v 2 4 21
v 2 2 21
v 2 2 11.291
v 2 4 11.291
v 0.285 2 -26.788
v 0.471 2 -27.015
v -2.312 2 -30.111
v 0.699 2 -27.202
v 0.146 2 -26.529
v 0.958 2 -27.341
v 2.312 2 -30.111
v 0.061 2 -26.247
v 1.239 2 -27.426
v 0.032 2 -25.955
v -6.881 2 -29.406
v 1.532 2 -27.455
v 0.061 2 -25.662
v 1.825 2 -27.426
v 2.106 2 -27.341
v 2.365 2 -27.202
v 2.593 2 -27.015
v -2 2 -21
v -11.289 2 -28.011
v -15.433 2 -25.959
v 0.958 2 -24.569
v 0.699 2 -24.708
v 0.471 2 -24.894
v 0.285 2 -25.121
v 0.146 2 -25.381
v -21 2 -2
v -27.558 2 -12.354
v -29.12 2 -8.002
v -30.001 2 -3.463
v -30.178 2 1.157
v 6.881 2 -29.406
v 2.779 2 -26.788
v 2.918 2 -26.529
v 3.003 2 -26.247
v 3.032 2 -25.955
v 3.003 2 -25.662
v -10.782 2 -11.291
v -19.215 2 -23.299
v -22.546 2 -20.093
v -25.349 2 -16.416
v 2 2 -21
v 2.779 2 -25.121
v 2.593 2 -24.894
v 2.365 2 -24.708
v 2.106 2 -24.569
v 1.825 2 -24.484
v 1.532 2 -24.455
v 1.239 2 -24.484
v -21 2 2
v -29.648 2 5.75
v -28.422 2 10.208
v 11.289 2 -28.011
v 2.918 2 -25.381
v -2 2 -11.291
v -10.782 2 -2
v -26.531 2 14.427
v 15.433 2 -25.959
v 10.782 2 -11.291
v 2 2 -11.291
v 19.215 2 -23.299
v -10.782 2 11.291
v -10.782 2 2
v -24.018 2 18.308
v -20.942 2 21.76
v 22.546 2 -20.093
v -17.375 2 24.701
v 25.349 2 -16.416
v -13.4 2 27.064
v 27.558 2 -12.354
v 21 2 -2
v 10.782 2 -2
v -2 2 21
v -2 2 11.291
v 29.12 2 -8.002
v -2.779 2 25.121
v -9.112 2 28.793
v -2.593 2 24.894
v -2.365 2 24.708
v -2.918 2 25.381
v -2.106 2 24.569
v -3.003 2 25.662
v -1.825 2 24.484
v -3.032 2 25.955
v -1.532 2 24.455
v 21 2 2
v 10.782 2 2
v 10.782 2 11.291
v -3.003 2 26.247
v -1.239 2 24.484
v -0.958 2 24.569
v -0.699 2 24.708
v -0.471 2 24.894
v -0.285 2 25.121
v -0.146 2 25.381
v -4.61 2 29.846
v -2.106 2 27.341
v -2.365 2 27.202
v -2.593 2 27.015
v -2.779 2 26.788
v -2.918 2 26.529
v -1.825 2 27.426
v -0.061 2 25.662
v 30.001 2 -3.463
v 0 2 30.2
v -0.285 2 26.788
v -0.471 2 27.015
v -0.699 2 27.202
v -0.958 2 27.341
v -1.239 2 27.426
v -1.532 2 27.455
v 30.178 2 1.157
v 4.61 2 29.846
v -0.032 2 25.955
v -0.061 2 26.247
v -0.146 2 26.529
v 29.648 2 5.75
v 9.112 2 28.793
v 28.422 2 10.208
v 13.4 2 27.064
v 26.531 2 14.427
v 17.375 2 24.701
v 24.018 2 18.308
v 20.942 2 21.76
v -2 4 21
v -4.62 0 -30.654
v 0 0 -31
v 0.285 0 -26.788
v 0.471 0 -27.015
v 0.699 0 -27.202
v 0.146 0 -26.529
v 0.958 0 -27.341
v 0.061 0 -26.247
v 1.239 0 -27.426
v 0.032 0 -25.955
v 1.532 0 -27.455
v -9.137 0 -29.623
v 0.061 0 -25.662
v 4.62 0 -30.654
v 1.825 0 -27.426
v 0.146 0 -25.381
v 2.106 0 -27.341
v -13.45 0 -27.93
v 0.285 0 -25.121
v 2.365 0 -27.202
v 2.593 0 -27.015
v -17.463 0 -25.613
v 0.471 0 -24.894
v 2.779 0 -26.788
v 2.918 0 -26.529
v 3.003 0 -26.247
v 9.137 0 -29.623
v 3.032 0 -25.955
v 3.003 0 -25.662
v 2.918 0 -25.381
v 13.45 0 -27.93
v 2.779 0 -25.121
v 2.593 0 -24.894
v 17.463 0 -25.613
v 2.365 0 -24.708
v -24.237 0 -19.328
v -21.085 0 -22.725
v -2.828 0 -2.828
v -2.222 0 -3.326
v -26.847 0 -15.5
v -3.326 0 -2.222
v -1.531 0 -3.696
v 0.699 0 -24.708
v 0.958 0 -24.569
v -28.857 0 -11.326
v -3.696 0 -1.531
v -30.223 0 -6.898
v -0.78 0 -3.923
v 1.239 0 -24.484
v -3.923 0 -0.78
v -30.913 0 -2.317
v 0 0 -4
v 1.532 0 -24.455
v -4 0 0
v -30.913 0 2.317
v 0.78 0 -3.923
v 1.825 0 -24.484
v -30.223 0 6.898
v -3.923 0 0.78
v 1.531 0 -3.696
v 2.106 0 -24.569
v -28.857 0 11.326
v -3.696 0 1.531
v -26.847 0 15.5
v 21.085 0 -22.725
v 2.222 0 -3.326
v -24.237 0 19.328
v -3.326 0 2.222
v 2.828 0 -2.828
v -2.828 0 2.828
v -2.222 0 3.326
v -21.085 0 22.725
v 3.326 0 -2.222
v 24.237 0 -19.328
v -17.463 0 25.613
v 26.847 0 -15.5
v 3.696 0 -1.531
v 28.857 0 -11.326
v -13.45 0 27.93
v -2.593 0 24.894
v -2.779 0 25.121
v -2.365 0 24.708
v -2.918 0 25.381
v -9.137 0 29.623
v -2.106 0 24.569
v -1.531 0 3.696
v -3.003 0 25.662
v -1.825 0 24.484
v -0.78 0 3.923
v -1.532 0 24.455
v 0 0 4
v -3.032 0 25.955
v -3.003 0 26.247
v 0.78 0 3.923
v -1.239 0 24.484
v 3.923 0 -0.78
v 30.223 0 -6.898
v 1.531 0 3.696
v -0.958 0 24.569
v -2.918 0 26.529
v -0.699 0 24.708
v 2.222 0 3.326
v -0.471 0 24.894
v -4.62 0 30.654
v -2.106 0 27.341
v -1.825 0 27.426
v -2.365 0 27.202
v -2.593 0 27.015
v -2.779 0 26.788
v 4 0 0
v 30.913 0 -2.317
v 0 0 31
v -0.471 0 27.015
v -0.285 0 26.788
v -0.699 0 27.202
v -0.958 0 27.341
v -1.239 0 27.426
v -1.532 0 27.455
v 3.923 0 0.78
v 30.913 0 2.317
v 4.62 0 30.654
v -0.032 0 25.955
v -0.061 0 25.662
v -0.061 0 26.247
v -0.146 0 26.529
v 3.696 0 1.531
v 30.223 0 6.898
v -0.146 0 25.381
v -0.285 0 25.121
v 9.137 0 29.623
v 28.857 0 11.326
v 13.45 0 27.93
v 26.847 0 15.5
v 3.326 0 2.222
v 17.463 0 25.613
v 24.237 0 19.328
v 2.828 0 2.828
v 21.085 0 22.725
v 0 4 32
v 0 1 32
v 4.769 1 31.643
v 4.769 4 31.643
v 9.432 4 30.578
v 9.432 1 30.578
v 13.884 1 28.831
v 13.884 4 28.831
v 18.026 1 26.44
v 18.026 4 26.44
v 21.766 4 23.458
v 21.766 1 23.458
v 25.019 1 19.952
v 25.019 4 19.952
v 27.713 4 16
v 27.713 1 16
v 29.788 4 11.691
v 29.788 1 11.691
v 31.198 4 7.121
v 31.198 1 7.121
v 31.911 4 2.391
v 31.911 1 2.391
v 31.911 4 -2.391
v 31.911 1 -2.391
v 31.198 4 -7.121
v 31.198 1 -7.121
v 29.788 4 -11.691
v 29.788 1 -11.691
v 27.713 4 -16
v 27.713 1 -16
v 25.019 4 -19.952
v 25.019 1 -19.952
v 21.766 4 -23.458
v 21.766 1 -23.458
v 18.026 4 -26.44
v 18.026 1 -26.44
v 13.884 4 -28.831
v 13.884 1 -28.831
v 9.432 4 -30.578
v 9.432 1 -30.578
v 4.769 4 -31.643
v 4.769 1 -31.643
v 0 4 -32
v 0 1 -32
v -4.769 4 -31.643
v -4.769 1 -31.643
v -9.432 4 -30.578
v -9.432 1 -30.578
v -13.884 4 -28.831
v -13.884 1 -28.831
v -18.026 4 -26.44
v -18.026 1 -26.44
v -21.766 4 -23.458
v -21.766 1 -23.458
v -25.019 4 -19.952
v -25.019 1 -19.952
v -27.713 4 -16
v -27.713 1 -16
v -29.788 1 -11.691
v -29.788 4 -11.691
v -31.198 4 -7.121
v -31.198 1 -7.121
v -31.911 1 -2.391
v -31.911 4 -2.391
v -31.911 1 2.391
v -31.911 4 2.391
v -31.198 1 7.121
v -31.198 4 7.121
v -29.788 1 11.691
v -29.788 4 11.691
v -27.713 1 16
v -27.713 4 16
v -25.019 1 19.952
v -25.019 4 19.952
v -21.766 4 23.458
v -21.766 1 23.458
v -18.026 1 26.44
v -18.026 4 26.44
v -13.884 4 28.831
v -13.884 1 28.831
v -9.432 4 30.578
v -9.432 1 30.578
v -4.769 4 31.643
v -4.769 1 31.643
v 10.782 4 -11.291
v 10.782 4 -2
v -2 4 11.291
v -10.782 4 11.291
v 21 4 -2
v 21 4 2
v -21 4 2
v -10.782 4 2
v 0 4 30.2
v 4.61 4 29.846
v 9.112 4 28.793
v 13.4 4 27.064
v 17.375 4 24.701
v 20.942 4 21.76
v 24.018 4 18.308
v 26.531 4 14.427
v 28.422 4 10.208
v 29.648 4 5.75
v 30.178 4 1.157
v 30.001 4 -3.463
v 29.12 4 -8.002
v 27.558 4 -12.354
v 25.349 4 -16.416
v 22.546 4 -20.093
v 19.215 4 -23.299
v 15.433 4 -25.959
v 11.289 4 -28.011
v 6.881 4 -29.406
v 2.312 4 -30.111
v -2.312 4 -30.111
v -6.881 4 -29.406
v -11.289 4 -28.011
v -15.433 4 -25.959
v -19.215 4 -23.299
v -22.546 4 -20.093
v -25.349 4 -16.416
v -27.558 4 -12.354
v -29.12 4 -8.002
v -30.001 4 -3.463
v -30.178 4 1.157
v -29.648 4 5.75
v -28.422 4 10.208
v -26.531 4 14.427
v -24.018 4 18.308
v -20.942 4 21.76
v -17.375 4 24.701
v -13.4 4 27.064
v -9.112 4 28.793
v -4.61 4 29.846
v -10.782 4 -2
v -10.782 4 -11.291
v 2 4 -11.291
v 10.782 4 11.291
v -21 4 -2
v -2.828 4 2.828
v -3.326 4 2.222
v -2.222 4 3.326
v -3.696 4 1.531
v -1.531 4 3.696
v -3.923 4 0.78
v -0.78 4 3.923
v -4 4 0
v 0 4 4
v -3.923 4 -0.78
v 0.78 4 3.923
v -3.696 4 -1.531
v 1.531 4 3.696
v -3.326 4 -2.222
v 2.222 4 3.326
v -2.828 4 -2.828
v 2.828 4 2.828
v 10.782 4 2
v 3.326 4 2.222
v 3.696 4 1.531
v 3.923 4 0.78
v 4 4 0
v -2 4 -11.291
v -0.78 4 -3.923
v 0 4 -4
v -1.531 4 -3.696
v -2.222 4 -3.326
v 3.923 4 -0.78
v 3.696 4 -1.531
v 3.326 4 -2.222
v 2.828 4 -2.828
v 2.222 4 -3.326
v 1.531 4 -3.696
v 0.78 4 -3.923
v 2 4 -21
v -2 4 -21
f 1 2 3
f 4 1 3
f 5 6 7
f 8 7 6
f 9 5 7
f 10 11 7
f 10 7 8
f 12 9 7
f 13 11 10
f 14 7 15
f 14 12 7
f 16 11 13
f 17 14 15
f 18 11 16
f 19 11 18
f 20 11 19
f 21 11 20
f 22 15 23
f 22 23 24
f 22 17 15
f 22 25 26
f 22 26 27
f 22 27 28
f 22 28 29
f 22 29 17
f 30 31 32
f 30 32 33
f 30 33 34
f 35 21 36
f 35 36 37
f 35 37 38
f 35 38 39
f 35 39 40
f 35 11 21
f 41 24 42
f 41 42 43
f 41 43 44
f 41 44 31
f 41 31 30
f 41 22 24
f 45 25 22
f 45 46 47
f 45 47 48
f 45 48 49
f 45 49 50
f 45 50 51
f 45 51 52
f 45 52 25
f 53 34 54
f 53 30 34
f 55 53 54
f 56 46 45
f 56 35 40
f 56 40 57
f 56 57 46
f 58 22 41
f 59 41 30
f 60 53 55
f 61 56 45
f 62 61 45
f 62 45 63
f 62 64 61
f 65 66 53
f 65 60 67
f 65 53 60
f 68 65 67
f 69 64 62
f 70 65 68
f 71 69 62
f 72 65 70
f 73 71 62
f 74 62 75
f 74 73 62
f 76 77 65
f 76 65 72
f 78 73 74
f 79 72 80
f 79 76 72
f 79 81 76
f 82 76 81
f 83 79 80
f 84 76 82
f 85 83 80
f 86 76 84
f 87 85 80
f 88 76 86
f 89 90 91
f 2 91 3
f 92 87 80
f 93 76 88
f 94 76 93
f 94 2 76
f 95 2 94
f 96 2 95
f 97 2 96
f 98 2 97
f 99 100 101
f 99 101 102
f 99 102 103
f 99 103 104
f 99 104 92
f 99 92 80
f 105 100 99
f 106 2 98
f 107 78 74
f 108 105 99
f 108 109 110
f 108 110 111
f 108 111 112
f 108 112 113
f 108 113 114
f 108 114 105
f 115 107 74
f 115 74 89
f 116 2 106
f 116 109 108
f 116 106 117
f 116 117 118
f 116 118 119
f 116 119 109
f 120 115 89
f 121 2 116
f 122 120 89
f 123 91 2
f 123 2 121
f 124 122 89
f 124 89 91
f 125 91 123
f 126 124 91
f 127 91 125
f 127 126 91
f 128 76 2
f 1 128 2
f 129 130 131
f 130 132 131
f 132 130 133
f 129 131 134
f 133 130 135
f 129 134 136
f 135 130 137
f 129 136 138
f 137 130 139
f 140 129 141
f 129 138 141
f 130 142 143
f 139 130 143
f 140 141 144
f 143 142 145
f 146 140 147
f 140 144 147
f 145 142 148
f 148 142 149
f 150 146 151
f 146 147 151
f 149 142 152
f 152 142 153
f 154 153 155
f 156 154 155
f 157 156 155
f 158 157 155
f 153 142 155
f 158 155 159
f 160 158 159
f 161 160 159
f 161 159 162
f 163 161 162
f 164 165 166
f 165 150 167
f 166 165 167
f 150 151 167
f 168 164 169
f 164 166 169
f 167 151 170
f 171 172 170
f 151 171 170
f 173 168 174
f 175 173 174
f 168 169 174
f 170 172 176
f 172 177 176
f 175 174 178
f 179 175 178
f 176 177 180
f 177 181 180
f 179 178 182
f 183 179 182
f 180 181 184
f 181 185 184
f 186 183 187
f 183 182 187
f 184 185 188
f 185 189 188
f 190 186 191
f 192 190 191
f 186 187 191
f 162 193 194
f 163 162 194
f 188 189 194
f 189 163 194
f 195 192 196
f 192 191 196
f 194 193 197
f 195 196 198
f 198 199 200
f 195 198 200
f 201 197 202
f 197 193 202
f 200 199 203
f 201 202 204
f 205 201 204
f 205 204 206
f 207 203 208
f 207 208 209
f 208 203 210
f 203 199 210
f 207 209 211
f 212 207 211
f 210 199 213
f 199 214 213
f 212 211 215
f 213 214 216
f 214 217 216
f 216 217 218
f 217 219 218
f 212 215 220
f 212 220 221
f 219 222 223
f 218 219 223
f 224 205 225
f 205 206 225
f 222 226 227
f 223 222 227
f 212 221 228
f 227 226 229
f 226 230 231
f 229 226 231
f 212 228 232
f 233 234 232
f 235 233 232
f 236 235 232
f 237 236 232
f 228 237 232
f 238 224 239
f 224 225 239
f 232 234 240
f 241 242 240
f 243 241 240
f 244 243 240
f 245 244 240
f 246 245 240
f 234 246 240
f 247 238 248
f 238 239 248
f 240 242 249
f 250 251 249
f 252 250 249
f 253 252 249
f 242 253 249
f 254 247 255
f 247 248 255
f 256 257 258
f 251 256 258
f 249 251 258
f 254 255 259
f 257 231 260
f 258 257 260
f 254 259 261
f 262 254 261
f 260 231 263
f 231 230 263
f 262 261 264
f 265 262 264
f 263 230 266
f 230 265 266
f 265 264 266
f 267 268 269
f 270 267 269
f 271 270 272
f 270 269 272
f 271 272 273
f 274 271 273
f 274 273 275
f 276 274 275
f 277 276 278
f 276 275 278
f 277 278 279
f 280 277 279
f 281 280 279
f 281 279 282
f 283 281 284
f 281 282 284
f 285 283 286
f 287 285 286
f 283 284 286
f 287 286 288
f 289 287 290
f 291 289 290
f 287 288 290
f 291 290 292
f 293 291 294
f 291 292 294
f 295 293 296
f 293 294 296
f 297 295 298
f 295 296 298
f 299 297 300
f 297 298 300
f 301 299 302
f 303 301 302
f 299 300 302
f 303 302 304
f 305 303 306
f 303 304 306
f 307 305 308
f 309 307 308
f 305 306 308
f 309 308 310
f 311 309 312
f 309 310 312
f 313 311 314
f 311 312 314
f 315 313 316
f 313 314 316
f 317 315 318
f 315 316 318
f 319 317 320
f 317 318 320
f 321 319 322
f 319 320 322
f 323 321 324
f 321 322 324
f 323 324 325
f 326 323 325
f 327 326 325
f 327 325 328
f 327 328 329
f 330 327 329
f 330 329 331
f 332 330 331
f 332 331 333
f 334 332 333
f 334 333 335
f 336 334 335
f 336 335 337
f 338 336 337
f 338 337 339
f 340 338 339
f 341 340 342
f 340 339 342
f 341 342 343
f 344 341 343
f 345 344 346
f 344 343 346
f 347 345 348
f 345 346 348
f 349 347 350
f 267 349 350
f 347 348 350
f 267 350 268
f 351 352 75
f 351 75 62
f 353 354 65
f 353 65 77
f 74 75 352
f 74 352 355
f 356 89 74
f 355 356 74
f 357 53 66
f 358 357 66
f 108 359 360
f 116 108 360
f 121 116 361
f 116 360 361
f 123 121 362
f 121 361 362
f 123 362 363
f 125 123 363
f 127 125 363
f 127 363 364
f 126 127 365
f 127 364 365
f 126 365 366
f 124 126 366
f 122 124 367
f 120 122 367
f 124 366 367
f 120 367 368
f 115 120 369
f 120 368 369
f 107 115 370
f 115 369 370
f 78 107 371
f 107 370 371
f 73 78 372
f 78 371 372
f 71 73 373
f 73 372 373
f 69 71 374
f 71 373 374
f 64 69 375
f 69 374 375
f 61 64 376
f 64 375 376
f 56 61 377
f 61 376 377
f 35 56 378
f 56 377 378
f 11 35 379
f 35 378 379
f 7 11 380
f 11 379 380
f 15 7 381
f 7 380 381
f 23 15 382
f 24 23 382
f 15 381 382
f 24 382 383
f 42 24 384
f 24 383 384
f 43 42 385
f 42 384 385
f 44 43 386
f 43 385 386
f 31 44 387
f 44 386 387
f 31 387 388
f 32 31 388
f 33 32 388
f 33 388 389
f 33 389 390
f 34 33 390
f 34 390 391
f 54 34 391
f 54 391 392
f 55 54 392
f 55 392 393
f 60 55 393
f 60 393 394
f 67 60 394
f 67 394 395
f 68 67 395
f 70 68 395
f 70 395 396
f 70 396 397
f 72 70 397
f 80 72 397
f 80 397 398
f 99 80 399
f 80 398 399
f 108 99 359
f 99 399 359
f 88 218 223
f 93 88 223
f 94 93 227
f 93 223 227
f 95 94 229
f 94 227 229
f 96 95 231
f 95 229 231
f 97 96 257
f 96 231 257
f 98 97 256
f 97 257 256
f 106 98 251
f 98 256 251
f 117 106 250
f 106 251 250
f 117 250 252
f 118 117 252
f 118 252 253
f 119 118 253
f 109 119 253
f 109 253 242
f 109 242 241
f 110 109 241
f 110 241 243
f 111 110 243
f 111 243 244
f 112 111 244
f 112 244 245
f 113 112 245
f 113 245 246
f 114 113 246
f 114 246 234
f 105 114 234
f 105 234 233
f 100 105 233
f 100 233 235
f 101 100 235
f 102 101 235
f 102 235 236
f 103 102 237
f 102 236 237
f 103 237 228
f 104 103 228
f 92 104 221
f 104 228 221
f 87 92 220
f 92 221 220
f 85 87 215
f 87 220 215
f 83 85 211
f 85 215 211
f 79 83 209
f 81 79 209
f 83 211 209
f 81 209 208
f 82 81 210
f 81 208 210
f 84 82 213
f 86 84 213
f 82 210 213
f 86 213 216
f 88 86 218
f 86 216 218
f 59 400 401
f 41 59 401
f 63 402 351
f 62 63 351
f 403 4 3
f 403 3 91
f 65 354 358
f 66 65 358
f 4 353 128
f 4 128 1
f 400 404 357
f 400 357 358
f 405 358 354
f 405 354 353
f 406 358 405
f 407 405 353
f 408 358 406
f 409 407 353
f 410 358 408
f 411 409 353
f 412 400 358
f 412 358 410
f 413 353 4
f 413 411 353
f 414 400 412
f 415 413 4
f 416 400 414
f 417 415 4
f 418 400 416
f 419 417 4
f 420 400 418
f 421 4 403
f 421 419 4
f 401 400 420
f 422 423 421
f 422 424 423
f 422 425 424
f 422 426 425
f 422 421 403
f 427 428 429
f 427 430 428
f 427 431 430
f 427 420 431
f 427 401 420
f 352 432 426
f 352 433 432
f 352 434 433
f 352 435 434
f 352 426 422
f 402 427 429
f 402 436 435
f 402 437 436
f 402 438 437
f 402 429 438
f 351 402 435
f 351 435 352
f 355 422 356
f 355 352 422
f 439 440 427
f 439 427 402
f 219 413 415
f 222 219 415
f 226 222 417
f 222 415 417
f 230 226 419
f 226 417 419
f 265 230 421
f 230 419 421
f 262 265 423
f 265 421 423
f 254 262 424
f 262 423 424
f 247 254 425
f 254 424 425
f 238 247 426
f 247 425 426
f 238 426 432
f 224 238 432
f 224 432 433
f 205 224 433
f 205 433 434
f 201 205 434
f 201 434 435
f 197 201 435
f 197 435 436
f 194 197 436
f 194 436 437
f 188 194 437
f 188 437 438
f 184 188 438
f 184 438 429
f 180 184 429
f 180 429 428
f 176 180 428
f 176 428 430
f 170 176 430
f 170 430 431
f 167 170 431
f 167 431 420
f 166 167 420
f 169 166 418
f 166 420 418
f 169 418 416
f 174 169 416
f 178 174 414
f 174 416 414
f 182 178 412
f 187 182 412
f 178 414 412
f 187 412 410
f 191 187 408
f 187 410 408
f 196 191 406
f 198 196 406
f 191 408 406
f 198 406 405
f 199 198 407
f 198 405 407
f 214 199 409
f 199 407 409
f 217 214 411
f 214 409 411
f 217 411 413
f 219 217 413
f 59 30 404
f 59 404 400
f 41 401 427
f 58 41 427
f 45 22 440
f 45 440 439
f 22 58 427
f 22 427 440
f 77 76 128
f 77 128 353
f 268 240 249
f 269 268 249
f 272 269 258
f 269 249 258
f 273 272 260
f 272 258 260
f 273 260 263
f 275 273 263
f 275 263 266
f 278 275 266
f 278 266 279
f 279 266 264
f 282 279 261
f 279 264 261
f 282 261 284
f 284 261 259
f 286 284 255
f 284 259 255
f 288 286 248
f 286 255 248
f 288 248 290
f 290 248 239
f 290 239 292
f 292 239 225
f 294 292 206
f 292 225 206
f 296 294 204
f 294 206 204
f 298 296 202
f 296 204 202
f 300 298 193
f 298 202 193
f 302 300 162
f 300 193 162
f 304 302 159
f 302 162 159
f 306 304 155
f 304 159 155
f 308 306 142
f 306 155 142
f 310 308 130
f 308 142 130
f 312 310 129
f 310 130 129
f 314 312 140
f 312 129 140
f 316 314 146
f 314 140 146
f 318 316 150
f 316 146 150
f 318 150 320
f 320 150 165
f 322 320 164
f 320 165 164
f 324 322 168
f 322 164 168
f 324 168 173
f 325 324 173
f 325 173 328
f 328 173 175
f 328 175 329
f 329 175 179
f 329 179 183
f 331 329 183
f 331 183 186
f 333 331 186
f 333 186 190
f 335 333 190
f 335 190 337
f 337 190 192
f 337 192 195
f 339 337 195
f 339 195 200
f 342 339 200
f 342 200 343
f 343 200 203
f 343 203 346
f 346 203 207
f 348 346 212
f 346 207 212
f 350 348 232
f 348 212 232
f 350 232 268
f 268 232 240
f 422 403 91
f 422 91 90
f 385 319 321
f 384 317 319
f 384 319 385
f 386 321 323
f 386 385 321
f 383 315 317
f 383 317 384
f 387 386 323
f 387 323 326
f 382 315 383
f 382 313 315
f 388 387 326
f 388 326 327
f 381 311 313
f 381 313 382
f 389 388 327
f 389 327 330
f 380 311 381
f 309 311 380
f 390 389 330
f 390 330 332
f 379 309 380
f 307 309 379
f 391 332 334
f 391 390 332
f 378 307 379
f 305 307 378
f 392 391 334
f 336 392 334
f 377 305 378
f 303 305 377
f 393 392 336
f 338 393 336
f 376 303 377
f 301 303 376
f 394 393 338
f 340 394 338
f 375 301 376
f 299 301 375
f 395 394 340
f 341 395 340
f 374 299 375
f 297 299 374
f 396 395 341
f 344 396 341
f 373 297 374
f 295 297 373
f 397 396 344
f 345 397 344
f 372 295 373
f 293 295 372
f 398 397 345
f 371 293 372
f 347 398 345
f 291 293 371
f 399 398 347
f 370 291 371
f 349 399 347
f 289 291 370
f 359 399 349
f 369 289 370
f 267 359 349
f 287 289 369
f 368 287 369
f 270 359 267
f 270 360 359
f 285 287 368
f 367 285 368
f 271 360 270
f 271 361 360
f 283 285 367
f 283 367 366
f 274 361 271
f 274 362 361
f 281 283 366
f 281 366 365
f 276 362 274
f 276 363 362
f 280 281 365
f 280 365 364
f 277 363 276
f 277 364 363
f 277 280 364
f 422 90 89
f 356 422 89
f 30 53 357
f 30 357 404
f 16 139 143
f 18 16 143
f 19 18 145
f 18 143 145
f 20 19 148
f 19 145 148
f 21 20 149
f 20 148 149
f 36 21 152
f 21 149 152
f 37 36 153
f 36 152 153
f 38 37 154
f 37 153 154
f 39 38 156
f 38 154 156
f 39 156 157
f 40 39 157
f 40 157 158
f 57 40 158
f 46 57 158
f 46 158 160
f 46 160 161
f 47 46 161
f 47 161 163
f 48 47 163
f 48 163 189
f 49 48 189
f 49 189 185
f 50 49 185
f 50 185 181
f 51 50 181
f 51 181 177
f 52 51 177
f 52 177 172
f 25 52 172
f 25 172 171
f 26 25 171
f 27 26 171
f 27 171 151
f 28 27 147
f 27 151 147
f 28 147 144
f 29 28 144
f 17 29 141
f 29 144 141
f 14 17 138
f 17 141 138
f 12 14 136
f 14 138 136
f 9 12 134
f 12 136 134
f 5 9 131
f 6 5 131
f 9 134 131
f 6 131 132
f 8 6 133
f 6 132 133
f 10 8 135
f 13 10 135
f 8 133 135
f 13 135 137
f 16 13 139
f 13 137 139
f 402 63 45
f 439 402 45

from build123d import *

# Parameters (mm, degrees)
SKETCH1_R           = 32
BOSS_EXTRUDE1_DEPTH = 4
SKETCH2_R           = 30.2
CUT_EXTRUDE1_DEPTH  = 2
CHAMFER1_SIZE       = 1
SKETCH3_R           = 1.5
CUT_EXTRUDE2_DEPTH  = 15
SKETCH5_W           = 4
SKETCH5_H           = 42
SKETCH5_W_2         = 42
SKETCH5_H_2         = 4
BOSS_EXTRUDE2_DEPTH = 2
SKETCH6_R           = 4
CUT_EXTRUDE3_DEPTH  = 10
SKETCH7_W           = 15
SKETCH7_H           = 20
CUT_EXTRUDE4_DEPTH  = 10
BOSS_EXTRUDE3_START = 2
SKETCH8_W           = 21.56425071
SKETCH8_H           = 22.582305464
SKETCH8_R           = 4
BOSS_EXTRUDE3_DEPTH = 2


with BuildPart() as part:
    # Sketch1 → Boss-Extrude1 (new body)
    with BuildSketch(Plane(origin=(0, 0, 0), x_dir=(1, 0, 0), z_dir=(0, 1, 0))):
        with Locations(Location((0, 0, 0), (0, 0, 270))):
            Circle(SKETCH1_R)
    extrude(amount=BOSS_EXTRUDE1_DEPTH)

    # Sketch2 → Cut-Extrude1 (cut)
    with BuildSketch(Plane(origin=(0, 4, 0), x_dir=(1, 0, 0), z_dir=(0, 1, 0))):
        with Locations(Location((0, 0, 0), (0, 0, 270))):
            Circle(SKETCH2_R)
    extrude(amount=-CUT_EXTRUDE1_DEPTH, mode=Mode.SUBTRACT)

    # Chamfer1
    chamfer1_edges = [part.edges().sort_by_distance(p)[0] for p in [
        (0, 0, -32),
    ]]
    chamfer(chamfer1_edges, length=CHAMFER1_SIZE)

    # Sketch3 → Cut-Extrude2 (cut)
    with BuildSketch(Plane.XZ):
        with Locations(Location((-1.532005462, 25.954825356, 0), (0, 0, 270))):
            Circle(SKETCH3_R)
        with Locations(Location((1.532016667, -25.954824695, 0), (0, 0, 270))):
            Circle(SKETCH3_R)
    extrude(amount=-CUT_EXTRUDE2_DEPTH, mode=Mode.SUBTRACT)

    # Sketch5 → Boss-Extrude2 (add)
    with BuildSketch(Plane(origin=(0, 2, 0), x_dir=(1, 0, 0), z_dir=(0, 1, 0))):
        Rectangle(SKETCH5_W, SKETCH5_H)
        Rectangle(SKETCH5_W_2, SKETCH5_H_2)
    extrude(amount=BOSS_EXTRUDE2_DEPTH)

    # Sketch6 → Cut-Extrude3 (cut)
    with BuildSketch(Plane(origin=(0, 4, 0), x_dir=(1, 0, 0), z_dir=(0, 1, 0))):
        with Locations(Location((0, 0, 0), (0, 0, 270))):
            Circle(SKETCH6_R)
    extrude(amount=-CUT_EXTRUDE3_DEPTH, mode=Mode.SUBTRACT)

    # Sketch7 → Cut-Extrude4 (cut)
    with BuildSketch(Plane(origin=(0, 2, 0), x_dir=(1, 0, 0), z_dir=(0, 1, 0))):
        Rectangle(SKETCH7_W, SKETCH7_H)
    extrude(amount=CUT_EXTRUDE4_DEPTH, mode=Mode.SUBTRACT)

    # Sketch8 → Boss-Extrude3 (add)
    with BuildSketch(Plane(origin=(0, 2, 0), x_dir=(1, 0, 0), z_dir=(0, 1, 0)).offset(BOSS_EXTRUDE3_START)):
        Rectangle(SKETCH8_W, SKETCH8_H)
        with Locations(Location((0, 0, 0), (0, 0, 270))):
            Circle(SKETCH8_R, mode=Mode.SUBTRACT)
    extrude(amount=-BOSS_EXTRUDE3_DEPTH)


solid = part.part
